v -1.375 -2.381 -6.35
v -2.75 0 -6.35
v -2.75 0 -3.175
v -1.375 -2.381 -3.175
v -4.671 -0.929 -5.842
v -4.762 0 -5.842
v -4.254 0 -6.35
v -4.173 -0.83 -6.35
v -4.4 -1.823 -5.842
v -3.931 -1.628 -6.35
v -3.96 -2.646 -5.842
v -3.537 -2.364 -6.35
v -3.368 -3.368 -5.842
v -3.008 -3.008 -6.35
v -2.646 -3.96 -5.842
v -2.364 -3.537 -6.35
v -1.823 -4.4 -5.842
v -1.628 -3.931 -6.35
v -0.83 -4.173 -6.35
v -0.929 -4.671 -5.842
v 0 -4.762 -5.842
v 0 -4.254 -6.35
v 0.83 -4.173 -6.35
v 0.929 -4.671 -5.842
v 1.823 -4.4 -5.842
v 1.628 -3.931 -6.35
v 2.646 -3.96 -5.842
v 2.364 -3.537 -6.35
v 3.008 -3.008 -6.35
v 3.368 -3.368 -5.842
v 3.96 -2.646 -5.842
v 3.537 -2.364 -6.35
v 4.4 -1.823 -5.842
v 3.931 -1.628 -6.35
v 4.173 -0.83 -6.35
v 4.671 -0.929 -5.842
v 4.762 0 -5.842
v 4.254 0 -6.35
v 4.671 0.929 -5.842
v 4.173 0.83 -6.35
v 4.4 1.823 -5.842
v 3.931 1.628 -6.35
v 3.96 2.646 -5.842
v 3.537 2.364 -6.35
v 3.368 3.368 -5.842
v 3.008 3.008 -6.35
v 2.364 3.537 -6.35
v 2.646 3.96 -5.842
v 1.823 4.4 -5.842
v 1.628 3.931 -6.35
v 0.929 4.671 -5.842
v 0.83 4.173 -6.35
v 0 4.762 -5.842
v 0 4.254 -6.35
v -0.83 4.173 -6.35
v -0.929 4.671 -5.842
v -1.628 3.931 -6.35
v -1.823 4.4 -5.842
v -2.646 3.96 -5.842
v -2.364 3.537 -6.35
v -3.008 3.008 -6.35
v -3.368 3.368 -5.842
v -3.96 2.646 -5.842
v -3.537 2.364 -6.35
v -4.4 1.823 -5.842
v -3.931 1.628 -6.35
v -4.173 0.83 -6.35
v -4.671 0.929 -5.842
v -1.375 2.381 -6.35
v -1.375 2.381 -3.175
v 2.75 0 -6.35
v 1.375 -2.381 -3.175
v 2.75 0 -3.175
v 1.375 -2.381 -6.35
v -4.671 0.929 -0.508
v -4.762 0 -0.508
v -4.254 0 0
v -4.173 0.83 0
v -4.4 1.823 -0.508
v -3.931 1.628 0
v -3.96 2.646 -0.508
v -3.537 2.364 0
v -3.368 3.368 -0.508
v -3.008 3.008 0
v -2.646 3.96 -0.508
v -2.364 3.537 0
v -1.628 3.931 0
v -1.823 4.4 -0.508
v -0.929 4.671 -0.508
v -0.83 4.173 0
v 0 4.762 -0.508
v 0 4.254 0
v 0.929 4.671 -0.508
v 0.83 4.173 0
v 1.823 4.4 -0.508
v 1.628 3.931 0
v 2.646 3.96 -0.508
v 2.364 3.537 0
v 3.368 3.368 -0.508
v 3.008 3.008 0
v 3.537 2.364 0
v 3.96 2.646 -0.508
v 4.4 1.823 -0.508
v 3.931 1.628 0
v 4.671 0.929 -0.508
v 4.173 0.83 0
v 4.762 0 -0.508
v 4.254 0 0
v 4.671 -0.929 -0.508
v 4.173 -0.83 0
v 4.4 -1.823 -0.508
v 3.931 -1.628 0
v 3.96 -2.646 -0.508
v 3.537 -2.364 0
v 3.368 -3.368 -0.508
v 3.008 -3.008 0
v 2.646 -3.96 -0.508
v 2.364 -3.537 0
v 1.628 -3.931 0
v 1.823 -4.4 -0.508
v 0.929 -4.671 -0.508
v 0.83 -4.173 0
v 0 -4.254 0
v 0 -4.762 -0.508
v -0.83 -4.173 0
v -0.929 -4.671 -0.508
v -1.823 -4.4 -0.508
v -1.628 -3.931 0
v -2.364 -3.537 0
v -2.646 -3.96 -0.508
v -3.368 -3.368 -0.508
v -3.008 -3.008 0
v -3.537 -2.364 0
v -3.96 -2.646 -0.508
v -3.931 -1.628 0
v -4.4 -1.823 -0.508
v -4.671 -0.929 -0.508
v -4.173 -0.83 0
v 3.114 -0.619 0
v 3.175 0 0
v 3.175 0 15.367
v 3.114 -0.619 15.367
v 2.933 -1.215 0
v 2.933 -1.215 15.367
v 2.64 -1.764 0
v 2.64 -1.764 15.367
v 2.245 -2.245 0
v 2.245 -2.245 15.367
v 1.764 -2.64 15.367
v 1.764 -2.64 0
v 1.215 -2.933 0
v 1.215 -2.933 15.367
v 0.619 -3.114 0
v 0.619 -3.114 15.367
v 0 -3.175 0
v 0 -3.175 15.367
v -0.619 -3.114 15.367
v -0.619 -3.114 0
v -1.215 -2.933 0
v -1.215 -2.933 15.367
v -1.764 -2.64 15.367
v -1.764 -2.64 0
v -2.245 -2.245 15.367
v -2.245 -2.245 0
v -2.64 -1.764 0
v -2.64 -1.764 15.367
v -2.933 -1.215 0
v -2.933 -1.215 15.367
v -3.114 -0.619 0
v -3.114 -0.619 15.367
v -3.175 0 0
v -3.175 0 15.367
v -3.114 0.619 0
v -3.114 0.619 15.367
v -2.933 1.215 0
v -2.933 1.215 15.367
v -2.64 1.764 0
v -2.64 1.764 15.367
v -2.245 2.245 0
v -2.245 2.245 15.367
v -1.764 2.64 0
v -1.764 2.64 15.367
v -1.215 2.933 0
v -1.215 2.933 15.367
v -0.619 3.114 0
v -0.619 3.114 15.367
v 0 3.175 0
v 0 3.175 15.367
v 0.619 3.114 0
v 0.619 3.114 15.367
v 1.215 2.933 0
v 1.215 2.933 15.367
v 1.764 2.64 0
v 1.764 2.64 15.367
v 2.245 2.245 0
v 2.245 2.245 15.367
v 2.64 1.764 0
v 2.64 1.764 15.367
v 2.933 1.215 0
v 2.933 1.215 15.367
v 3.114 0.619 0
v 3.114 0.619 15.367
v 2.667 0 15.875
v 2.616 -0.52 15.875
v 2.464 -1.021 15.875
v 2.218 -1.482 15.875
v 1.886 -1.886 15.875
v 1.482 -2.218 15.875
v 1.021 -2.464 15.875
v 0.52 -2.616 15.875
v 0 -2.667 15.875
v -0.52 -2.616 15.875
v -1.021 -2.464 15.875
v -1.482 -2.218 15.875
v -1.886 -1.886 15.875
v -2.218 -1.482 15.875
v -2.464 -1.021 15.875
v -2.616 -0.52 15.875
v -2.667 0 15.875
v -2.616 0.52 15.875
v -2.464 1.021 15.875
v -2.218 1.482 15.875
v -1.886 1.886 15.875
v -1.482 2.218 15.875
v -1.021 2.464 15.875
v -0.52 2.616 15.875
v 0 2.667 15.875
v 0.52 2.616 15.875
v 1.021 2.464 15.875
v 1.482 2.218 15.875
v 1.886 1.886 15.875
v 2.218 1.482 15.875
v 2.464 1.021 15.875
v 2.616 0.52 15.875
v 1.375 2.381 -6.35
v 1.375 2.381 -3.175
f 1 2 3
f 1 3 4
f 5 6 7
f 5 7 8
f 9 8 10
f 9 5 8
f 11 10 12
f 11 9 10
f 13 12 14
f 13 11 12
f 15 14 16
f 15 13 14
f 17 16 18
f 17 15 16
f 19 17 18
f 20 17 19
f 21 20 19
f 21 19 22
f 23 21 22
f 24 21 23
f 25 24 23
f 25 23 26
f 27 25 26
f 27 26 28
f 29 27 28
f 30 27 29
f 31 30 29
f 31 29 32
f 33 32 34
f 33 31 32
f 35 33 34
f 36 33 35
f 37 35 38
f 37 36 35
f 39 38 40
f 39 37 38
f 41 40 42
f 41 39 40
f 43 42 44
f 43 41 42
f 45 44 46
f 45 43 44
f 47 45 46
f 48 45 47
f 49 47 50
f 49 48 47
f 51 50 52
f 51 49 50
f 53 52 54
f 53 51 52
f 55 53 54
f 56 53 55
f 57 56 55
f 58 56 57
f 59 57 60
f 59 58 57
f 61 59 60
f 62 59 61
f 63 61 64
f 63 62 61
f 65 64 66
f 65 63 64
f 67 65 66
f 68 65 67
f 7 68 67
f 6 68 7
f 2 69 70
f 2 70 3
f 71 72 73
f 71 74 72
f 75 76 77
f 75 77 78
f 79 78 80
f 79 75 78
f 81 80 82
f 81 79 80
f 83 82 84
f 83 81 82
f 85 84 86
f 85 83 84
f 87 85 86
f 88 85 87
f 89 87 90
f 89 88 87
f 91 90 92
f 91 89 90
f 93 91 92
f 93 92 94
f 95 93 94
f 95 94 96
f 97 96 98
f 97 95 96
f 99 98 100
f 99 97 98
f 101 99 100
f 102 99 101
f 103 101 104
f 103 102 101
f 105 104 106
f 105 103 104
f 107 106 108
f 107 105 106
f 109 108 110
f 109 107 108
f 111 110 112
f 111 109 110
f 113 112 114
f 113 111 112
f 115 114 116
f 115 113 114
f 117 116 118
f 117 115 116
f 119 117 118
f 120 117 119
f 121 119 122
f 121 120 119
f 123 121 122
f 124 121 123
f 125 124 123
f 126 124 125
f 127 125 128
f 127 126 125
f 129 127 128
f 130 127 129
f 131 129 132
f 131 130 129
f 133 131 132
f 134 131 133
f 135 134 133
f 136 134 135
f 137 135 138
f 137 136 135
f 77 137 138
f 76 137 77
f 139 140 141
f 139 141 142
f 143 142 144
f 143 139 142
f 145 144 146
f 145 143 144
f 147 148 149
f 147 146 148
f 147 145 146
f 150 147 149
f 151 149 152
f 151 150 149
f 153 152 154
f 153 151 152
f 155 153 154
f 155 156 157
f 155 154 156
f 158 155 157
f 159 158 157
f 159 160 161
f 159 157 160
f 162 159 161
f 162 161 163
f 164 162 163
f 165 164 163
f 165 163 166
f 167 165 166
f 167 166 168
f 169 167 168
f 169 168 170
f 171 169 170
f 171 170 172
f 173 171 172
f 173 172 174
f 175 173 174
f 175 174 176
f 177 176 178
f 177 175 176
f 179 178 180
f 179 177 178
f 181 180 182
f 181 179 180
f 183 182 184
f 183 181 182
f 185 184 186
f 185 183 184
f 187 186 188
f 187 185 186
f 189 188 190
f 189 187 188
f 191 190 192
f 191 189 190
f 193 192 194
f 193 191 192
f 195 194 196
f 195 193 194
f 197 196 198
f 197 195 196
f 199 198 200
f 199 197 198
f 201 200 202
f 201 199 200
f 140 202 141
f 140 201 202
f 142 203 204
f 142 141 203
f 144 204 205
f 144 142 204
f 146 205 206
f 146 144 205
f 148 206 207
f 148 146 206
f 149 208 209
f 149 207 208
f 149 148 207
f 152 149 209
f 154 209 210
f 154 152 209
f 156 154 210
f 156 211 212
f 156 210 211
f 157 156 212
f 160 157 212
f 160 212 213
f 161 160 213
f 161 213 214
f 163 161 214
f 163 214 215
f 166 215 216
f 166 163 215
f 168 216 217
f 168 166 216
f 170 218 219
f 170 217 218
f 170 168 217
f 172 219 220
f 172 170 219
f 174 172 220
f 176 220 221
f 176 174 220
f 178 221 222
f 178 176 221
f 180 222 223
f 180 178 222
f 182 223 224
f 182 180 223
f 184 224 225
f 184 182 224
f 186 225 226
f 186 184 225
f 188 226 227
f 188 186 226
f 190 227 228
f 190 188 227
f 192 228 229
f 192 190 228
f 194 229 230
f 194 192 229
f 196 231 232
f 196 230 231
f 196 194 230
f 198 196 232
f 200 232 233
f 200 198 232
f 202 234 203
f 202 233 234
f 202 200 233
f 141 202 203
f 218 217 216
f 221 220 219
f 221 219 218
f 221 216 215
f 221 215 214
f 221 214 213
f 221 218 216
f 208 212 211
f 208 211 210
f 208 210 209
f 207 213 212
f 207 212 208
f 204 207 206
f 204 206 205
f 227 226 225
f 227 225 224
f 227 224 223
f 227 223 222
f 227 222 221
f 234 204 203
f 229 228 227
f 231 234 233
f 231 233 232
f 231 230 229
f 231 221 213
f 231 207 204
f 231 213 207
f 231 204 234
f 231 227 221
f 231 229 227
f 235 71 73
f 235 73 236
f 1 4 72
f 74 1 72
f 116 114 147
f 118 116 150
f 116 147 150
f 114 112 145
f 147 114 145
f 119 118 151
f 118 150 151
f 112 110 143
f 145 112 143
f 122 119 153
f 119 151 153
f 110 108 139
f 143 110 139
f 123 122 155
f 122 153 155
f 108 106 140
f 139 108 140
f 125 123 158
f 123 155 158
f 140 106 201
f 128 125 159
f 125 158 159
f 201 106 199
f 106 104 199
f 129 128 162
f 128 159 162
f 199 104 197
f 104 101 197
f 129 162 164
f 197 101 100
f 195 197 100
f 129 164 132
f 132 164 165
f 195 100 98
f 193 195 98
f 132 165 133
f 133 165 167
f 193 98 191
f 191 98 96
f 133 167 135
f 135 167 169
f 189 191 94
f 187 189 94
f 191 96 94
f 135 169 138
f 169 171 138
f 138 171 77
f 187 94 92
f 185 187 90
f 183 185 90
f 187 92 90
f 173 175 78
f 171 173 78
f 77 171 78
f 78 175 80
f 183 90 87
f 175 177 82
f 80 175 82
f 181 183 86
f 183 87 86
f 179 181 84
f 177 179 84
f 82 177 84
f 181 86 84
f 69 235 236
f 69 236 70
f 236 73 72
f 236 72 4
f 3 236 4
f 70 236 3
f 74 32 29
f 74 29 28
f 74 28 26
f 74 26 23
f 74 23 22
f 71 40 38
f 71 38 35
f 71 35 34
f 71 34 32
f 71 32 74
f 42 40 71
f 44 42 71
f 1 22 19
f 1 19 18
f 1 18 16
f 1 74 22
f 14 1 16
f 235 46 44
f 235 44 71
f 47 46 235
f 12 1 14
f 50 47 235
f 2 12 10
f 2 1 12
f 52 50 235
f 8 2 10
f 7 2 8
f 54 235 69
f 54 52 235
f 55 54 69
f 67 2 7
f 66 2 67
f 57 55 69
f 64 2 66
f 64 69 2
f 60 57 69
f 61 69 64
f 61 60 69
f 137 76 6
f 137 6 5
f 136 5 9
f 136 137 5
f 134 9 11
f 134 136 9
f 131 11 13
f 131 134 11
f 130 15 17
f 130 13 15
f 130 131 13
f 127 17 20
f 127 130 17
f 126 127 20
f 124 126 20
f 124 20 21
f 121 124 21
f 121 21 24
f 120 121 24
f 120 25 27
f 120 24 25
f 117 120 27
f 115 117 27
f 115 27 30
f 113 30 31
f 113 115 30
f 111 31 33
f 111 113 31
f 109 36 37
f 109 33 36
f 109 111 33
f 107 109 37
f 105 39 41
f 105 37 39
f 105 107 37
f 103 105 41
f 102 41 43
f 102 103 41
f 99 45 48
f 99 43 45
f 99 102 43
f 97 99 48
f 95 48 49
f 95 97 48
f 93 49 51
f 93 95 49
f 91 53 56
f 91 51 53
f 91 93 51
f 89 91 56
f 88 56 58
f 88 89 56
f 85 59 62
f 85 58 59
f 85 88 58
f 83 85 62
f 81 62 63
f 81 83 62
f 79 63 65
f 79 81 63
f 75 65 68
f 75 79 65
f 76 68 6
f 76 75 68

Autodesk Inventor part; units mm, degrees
ref_plane "YZ Plane" through (0, 0, 0) normal (1, 0, 0) x (0, 1, 0)
ref_plane "XZ Plane" through (0, 0, 0) normal (0, 1, 0) x (-1, 0, 0)
ref_plane "XY Plane" through (0, 0, 0) normal (0, 0, 1) x (1, 0, 0)
sketch "Sketch1" plane through (0, 0, 0) normal (0, 0, 1) x (1, 0, 0)
  circle A0 centre (0, 0) radius 3.175
  dimension "d0" = 6.35
extrude "Extrusion1" add sketch "Sketch1" along normal blind 15.875
sketch "Sketch2" plane through (0, 0, 0) normal (0, 0, -1) x (-1, 0, 0)
  circle A0 centre (0, 0) radius 3.175 projected
  circle A1 centre (0, 0) radius 4.7625
  dimension "d3" = 9.525
extrude "Extrusion2" add sketch "Sketch2" along normal blind 6.35 contours A0 | A1
sketch "Sketch3" plane through (0, 0, -6.35) normal (0, 0, -1) x (-1, 0, 0)
  circle A0 centre (0, 0) radius 4.7625 projected
  line L0 (-1.3748, 2.3812) -> (1.3748, 2.3813)
  line L1 (1.3748, 2.3813) -> (2.7496, 0)
  line L2 (2.7496, 0) -> (1.3748, -2.3812)
  line L3 (1.3748, -2.3812) -> (-1.3748, -2.3812)
  line L4 (-1.3748, -2.3812) -> (-2.7496, 0)
  line L5 (-2.7496, 0) -> (-1.3748, 2.3812)
  dimension "d6" = 4.7625
extrude "Extrusion3" cut sketch "Sketch3" against normal blind 3.175 contours L0 L1 L2 L3 L4 L5
chamfer "Chamfer1" distance 0.508 angle 45 3 edges at (-3.175, 0, 15.875) (4.7625, 0, 0) (4.7625, 0, -6.35)
thread "Thread1" size "1/4-20 UNC" class "2A" standard "ANSI Unified Screw Threads" full length
properties part number "14-20 x750" material "Steel"
